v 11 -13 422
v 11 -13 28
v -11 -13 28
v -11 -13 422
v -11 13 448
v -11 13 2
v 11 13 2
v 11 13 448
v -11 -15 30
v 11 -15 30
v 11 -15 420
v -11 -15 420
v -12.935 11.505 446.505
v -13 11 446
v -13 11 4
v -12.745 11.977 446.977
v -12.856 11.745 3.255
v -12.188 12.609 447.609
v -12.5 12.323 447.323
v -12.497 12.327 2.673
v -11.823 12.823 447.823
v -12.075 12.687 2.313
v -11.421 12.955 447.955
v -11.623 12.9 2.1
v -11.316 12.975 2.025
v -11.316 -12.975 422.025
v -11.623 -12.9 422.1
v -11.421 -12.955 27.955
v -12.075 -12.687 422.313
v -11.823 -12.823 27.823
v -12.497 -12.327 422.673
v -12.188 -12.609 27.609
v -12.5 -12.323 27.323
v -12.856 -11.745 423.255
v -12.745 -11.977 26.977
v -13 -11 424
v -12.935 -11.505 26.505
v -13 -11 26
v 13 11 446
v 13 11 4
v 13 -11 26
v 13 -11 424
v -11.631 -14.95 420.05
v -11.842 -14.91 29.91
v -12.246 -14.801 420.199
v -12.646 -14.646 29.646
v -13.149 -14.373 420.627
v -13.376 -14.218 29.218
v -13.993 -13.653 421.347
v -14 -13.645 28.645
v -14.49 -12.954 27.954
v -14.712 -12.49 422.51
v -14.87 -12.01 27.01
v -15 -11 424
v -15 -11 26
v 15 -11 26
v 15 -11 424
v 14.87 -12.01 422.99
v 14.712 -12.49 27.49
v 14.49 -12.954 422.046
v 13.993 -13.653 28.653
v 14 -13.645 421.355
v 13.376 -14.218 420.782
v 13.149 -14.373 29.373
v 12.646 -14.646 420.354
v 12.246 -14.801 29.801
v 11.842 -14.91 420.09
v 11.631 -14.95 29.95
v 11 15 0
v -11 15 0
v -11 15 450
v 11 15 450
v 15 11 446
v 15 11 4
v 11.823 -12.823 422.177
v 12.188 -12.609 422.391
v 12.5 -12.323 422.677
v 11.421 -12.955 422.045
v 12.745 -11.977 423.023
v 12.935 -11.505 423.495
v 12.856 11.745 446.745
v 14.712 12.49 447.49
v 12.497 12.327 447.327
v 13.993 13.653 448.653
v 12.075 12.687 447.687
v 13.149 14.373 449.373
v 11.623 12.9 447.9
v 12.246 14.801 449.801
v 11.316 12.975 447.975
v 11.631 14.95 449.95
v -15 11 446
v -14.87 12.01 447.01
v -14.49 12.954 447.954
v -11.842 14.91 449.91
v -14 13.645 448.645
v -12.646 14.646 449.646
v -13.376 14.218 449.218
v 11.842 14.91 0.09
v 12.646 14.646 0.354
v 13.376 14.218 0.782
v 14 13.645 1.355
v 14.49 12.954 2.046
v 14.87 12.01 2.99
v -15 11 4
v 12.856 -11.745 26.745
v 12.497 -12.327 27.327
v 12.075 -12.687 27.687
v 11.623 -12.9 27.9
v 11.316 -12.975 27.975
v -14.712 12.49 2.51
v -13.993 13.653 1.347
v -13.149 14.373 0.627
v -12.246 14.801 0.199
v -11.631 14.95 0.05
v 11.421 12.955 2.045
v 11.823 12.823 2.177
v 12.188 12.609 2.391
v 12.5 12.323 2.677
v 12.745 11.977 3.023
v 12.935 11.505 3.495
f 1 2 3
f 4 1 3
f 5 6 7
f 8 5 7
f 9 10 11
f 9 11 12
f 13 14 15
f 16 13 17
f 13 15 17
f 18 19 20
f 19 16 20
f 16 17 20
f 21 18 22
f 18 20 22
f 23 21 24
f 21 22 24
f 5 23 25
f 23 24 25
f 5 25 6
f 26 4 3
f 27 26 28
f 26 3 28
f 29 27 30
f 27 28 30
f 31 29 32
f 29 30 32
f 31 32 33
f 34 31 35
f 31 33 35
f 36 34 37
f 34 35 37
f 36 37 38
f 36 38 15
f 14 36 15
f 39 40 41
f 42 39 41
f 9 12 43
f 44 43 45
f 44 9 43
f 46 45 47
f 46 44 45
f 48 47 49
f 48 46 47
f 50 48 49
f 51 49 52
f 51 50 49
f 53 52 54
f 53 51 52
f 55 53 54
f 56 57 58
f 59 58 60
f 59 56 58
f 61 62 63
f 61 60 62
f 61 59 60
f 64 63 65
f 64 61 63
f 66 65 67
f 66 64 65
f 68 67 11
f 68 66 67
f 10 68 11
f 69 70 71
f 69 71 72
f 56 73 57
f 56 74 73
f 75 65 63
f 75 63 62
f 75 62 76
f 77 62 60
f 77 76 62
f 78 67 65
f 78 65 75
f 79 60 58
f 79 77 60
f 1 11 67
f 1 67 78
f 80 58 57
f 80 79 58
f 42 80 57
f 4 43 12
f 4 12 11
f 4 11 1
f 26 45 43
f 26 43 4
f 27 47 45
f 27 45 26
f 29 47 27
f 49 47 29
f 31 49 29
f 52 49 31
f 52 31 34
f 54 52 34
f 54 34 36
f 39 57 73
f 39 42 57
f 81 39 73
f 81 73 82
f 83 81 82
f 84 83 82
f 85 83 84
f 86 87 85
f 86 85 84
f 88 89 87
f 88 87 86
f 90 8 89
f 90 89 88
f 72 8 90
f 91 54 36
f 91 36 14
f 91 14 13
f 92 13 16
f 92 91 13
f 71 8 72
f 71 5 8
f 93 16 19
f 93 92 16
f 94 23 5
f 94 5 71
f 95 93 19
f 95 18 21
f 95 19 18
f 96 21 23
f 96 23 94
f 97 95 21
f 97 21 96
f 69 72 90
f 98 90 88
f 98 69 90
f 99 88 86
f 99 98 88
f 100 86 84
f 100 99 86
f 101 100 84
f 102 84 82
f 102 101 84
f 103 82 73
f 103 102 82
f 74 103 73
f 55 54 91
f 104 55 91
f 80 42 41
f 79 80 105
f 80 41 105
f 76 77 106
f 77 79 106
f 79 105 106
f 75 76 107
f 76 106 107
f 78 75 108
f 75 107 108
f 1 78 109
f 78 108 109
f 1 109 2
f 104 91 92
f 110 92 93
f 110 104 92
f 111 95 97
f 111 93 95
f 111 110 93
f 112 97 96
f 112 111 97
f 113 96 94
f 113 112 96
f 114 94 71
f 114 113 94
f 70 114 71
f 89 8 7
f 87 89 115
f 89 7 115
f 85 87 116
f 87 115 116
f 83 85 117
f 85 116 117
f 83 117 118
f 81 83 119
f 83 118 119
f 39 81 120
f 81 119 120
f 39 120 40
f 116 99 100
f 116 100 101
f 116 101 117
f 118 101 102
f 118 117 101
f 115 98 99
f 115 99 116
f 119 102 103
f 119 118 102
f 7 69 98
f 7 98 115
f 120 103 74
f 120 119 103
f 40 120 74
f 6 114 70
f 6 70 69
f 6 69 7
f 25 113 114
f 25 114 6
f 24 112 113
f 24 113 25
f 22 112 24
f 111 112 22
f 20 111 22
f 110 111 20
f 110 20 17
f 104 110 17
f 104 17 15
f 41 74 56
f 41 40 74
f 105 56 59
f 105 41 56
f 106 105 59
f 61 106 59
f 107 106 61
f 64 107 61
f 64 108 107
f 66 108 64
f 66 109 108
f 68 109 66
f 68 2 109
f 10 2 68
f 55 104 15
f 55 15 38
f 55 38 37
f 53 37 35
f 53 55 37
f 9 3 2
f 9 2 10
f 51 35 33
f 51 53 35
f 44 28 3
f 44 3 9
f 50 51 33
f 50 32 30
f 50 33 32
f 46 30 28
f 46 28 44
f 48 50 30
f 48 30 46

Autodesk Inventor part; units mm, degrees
ref_plane "Plano inicial" through (0, 0, 0) normal (0, 0, 1) x (1, 0, 0)
ref_plane "Plano final" through (0, 0, 450) normal (0, 0, 1) x (1, 0, 0)
sketch "Esboço" plane through (0, 0, 0) normal (0, 0, 1) x (1, 0, 0)
  line L0 (-15, -11) -> (-15, 11)
  line L1 (-11, 15) -> (11, 15)
  line L2 (15, 11) -> (15, -11)
  line L3 (11, -15) -> (-11, -15)
  arc A0 (-15, -11) -> (-11, -15) centre (-11, -11) ccw
  arc A1 (15, 11) -> (11, 15) centre (11, 11) ccw
  arc A2 (-11, 15) -> (-15, 11) centre (-11, 11) ccw
  arc A3 (11, -15) -> (15, -11) centre (11, -11) ccw
  arc A4 (-11, 13) -> (-13, 11) centre (-11, 11) ccw
  line L4 (-11, 13) -> (11, 13)
  arc A5 (13, 11) -> (11, 13) centre (11, 11) ccw
  line L5 (13, 11) -> (13, -11)
  arc A6 (11, -13) -> (13, -11) centre (11, -11) ccw
  line L6 (11, -13) -> (-11, -13)
  arc A7 (-13, -11) -> (-11, -13) centre (-11, -11) ccw
  line L7 (-13, -11) -> (-13, 11)
  line L8 (0, 22.1598) -> (0, -22.1598) construction
  line L9 (-22.1598, 0) -> (22.1598, 0) construction
  dimension "d7" = 4
  dimension "d9" = 30
  dimension "d11" = 30
  dimension "d12" = 2
  dimension "d15" = 15
  dimension "d16" = 15
extrude "Corpo" add sketch "Esboço" along normal up to surface (450 mm away) from surface at 0
sketch "Sketch3" plane through (0, 0, 0) normal (0, 0, 1) x (1, 0, 0)
  line L0 (0, 0) -> (10, 0)
ref_plane "Work Plane3" through (0, 0, 0) normal (0, -1, 0) x (1, 0, 0)
sketch "Sketch4" plane through (0, 0, 0) normal (0, -1, 0) x (1, 0, 0)
  line L0 (-2, 0) -> (12, 0)
  line L1 (-2, 450) -> (12, 450)
  dimension "d18" = 450
ref_plane "Plano de trabalho6" through (155, 0, 450) normal (0, 0, 1) x (1, 0, 0)
split "Dividir3" plane through (155, 0, 450) removes the side toward (0, 0, 1)
ref_plane "Plano de trabalho7" through (0, 15, 0) normal (0, -0.7071, -0.7071) x (1, 0, 0)
split "Dividir4" plane through (0, 15, 0) removes the side toward (0, -0.7071, -0.7071)
ref_plane "Plano de trabalho8" through (0, 15, 450) normal (0, -0.7071, 0.7071) x (1, 0, 0)
split "Dividir5" plane through (0, 15, 450) removes the side toward (0, -0.7071, 0.7071)
equation "\"d7\" = G_IR"
equation "\"d9\" = G_W"
equation "\"d11\" = G_H"
equation "\"d12\" = G_T"
equation "\"d15\" = 0.5 * d9"
equation "\"d16\" = 0.5 * d11"
equation "\"d3\" = G_L"
equation "\"G_W\" = 30"
equation "\"G_H\" = 30"
equation "\"G_T\" = 2"
equation "\"G_IR\" = 4"
equation "\"G_L\" = d18"
equation "\"G_OFFSET_START\" = 0"
equation "\"G_OFFSET_END\" = 0"
properties part number "ISO 10799-2 - 30x30x2 - 450" material "Aço, suave"
